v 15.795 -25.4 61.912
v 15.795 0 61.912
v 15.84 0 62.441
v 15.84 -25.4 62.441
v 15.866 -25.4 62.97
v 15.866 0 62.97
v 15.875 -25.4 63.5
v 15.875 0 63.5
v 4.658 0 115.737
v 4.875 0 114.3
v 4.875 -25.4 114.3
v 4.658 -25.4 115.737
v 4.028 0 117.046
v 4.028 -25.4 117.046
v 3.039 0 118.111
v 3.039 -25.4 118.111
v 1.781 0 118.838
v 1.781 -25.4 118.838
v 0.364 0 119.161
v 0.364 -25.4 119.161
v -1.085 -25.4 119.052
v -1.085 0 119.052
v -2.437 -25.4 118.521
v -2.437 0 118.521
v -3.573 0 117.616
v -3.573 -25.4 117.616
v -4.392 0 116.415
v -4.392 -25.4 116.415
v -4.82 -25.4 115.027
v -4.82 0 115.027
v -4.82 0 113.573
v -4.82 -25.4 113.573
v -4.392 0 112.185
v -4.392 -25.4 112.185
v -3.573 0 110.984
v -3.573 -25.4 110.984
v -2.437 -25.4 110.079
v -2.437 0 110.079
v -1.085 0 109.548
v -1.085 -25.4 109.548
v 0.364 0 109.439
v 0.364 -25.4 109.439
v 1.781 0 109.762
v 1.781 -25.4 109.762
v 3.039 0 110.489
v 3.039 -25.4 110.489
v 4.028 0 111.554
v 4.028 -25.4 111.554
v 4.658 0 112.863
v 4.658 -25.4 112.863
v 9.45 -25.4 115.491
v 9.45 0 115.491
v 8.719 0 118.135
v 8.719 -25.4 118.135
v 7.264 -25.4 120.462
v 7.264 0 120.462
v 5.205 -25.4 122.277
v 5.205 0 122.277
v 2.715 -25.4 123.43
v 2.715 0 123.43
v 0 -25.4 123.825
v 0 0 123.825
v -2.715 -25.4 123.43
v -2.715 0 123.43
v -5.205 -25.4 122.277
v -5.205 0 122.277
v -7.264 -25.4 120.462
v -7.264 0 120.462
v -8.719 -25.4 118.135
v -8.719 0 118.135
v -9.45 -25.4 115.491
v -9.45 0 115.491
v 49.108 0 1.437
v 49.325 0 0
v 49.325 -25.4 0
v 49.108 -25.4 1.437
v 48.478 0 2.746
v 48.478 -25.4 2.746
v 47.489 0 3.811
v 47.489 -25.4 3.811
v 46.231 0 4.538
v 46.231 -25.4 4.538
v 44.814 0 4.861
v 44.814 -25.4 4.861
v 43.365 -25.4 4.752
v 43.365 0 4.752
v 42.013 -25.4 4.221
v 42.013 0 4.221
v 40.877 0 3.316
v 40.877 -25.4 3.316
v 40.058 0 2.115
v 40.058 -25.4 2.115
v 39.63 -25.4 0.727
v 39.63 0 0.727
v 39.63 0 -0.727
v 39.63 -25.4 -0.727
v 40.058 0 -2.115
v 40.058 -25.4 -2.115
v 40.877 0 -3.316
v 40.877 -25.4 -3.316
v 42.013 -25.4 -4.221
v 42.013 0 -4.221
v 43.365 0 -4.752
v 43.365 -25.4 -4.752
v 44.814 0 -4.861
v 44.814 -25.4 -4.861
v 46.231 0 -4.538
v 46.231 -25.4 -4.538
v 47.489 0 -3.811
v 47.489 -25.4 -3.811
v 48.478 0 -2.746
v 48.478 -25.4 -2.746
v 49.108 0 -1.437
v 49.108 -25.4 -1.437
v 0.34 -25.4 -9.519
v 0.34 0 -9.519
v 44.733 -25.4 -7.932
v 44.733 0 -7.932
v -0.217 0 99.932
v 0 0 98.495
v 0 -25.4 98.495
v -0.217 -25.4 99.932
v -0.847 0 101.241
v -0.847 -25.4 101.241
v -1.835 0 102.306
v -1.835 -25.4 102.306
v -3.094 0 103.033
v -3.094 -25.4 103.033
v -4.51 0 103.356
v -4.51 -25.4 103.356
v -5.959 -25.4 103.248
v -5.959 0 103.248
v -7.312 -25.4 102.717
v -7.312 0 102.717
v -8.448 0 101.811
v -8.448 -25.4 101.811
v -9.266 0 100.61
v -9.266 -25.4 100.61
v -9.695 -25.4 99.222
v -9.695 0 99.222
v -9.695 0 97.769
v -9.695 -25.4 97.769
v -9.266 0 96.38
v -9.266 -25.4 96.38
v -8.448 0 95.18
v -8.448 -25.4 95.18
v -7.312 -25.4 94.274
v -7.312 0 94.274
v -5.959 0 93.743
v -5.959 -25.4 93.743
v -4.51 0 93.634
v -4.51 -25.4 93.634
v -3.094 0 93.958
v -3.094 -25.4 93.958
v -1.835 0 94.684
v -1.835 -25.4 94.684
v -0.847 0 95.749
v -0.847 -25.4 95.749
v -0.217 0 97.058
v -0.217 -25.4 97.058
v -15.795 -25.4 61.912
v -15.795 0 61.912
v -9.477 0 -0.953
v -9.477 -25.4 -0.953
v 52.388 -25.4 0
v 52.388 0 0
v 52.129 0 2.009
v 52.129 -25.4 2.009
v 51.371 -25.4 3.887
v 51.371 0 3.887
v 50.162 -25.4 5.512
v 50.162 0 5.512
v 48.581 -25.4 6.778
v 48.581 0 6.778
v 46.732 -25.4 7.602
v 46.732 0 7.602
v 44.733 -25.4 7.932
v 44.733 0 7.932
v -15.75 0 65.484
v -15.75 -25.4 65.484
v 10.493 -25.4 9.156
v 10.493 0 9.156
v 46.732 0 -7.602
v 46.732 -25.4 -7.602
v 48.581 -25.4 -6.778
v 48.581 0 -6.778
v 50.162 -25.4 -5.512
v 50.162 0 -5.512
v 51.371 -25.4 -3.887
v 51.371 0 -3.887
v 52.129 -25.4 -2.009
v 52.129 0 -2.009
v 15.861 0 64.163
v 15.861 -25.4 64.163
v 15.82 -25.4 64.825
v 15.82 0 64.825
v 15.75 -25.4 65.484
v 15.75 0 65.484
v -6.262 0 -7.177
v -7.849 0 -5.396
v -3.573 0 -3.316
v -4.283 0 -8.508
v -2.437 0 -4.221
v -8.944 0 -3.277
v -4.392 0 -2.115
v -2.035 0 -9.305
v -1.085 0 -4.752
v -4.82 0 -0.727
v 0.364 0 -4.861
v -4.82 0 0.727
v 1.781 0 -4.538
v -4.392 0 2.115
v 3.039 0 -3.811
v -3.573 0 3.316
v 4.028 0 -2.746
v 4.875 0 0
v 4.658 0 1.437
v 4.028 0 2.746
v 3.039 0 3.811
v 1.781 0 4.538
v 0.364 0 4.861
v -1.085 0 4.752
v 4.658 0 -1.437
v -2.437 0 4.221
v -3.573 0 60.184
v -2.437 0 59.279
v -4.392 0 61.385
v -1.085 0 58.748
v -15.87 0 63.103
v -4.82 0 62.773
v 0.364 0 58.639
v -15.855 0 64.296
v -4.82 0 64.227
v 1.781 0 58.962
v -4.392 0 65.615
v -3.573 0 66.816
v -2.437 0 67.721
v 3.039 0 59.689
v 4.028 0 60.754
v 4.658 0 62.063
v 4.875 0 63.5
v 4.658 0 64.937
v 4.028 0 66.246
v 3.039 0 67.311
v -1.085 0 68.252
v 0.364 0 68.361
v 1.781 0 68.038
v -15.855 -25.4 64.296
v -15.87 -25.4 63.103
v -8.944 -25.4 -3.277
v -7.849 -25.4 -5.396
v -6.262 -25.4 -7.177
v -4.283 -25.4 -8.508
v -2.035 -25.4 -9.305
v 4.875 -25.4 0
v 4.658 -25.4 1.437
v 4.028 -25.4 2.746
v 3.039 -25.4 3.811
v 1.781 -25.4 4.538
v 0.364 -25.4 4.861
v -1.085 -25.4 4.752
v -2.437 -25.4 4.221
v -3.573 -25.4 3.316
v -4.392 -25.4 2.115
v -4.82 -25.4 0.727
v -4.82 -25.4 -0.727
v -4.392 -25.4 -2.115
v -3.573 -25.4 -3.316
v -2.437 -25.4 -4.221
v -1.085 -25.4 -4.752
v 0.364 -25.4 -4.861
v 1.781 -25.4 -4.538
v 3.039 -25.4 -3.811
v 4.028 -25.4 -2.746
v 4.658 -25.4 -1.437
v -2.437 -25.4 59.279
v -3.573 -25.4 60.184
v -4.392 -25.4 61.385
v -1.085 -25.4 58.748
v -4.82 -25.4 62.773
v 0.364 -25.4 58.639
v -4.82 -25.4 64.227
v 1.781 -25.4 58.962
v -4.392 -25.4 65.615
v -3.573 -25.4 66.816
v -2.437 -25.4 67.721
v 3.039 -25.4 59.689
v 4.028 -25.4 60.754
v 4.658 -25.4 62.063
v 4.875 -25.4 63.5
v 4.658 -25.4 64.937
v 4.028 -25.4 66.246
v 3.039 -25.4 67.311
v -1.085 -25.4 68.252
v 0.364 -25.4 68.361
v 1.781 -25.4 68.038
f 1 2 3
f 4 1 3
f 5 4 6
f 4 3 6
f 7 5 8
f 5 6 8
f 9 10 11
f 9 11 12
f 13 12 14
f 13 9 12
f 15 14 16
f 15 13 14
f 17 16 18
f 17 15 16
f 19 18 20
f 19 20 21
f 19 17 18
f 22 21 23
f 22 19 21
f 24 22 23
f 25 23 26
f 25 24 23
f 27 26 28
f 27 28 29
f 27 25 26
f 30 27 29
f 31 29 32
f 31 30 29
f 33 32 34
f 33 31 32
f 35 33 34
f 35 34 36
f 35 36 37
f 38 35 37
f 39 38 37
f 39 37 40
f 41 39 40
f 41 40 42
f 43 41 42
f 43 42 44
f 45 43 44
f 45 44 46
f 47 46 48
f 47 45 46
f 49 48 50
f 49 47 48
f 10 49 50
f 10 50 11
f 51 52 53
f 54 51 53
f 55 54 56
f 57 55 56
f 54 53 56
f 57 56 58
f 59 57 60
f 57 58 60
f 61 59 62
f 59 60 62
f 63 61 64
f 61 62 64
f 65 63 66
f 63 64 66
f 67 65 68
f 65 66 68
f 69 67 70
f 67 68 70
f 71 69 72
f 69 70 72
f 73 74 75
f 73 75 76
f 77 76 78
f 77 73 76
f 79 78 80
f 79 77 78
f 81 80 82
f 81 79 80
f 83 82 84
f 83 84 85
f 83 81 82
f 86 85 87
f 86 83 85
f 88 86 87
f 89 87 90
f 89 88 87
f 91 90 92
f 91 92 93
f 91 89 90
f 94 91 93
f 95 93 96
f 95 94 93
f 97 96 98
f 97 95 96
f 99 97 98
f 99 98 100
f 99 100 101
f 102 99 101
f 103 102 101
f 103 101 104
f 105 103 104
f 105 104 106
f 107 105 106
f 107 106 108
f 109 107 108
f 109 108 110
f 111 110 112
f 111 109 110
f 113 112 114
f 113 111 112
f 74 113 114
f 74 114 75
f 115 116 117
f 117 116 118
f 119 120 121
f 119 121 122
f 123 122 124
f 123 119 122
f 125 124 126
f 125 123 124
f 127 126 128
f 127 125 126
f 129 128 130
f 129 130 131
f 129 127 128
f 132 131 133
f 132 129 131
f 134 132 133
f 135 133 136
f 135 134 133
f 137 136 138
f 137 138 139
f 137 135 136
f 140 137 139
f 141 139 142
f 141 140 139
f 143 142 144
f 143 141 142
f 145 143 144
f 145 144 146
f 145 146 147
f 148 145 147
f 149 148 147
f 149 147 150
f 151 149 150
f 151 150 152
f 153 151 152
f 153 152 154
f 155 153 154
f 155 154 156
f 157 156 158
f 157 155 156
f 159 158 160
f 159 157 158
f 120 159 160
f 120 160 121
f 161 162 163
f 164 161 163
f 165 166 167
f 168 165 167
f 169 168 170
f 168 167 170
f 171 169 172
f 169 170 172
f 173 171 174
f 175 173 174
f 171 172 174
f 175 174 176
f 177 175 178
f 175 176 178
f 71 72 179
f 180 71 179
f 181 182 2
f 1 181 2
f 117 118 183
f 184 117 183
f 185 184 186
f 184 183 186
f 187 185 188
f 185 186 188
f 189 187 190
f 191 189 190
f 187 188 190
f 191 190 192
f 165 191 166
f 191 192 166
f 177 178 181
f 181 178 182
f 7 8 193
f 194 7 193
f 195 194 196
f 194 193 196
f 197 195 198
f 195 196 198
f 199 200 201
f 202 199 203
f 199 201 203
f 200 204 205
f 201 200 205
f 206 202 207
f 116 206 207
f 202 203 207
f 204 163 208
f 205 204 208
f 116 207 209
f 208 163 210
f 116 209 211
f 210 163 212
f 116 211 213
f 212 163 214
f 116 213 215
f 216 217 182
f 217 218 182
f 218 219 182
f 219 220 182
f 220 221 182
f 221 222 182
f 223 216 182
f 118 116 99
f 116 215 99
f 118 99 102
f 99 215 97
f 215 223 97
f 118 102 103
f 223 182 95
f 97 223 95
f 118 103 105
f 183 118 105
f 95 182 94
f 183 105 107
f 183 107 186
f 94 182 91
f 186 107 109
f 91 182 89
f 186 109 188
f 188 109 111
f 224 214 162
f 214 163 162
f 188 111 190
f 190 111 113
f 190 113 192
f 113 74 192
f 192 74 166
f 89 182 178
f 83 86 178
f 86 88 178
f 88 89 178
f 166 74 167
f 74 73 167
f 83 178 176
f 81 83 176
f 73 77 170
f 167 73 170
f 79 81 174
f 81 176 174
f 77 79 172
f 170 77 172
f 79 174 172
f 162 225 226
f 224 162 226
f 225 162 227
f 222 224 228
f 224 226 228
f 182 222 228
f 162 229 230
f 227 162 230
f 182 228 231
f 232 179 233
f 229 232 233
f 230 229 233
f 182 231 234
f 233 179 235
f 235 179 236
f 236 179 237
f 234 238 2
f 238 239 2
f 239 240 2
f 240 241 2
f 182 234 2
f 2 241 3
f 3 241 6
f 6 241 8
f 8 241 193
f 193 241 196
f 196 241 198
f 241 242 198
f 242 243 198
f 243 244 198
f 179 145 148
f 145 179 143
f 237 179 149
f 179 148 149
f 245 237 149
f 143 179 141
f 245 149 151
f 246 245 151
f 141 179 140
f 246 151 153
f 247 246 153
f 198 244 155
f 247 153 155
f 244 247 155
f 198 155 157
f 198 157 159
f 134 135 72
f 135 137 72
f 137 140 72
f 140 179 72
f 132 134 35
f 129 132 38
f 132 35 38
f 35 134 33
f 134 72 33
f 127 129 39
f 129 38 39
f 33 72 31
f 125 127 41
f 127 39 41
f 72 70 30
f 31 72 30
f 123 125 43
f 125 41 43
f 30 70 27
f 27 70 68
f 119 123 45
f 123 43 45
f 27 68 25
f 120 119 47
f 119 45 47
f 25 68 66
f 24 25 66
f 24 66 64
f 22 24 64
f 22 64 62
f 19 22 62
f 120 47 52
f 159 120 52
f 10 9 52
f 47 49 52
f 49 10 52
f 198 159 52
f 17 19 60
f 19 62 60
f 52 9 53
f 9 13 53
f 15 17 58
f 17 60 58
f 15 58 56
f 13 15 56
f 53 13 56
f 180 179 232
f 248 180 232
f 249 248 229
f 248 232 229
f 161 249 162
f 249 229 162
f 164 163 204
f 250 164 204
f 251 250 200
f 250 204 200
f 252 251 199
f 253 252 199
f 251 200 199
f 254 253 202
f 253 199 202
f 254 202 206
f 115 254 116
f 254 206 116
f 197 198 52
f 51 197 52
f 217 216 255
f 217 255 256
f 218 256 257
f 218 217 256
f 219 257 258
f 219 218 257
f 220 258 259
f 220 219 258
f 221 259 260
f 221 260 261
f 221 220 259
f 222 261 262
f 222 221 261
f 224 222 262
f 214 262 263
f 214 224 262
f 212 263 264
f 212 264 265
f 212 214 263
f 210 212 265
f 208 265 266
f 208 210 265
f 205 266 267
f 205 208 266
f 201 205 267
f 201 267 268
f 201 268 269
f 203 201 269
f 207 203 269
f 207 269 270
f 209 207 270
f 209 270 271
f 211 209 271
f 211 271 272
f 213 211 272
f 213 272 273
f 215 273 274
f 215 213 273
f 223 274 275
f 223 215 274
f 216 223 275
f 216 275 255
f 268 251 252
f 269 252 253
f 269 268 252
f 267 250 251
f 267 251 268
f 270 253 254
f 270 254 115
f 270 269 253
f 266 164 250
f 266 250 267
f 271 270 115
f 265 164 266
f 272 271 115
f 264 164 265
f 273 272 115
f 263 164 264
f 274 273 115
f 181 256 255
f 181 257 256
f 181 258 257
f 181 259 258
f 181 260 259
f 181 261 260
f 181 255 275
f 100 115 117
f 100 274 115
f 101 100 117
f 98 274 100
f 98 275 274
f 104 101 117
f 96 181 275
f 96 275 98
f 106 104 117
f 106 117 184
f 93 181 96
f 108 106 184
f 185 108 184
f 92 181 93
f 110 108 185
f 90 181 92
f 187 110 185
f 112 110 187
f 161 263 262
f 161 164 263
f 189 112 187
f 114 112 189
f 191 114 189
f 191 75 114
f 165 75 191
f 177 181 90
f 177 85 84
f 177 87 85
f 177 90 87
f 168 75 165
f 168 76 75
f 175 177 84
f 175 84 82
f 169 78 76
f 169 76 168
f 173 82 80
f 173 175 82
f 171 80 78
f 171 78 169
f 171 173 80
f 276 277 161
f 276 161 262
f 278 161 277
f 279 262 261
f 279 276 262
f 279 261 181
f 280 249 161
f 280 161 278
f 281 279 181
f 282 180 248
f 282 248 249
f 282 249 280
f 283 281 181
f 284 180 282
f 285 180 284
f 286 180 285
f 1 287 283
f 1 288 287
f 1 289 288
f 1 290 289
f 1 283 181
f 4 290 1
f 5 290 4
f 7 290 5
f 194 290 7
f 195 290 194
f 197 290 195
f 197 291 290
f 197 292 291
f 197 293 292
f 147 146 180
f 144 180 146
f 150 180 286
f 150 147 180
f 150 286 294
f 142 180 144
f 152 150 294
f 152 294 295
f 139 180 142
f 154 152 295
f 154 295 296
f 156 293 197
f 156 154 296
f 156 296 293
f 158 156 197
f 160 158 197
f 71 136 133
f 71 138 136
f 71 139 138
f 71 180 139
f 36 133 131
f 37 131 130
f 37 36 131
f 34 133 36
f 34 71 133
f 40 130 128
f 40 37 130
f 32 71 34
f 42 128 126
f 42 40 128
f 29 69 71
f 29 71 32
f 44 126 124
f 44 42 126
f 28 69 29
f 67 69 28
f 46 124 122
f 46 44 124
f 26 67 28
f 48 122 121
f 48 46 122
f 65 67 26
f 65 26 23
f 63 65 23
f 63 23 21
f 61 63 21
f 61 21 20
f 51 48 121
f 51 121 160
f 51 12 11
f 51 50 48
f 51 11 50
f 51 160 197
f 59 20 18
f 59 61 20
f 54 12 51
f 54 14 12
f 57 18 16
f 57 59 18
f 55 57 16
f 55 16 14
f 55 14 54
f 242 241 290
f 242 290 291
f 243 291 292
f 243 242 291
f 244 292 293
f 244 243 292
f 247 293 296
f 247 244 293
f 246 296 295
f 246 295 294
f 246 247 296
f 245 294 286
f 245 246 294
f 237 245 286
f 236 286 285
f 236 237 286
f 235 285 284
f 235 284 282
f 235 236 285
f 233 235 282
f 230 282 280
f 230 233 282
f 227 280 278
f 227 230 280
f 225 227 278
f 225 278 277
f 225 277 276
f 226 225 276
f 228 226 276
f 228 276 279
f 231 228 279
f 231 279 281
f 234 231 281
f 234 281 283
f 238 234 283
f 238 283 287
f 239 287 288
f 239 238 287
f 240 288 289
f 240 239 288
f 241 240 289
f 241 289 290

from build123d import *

# Parameters (mm, degrees)
F0_R     = 4.8745106906
F1_DEPTH = 25.4


with BuildPart() as f1:
    # F0 (on Front) → F1 (new body)
    with BuildSketch(Plane.XZ):
        with BuildLine():
            ThreePointArc((-9.4502929642, 115.490625), (-0.596483242, 104.7936951058), (9.525, 114.3))
            ThreePointArc((9.525, 114.3), (9.5063048942, 114.896483242), (9.4502929642, 115.490625))
            ThreePointArc((9.4502929642, 115.490625), (0, 123.825), (-9.4502929642, 115.490625))
        make_face()
        with Locations((0, 114.3)):
            Circle(F0_R, mode=Mode.SUBTRACT)
        with BuildLine():
            ThreePointArc((9.4502929642, 115.490625), (9.5063048942, 114.896483242), (9.525, 114.3))
            ThreePointArc((9.525, 114.3), (-0.596483242, 104.7936951058), (-9.4502929642, 115.490625))
            Line((-9.4502929642, 115.490625), (-15.7504882737, 65.484375))
            ThreePointArc((-15.7504882737, 65.484375), (0, 79.375), (15.7504882737, 65.484375))
            Line((15.7504882737, 65.484375), (9.4502929642, 115.490625))
        make_face()
        with Locations((-4.8745106906, 98.495259881)):
            Circle(F0_R, mode=Mode.SUBTRACT)
        with BuildLine():
            ThreePointArc((15.875, 63.5), (15.8438414904, 64.4941387366), (15.7504882737, 65.484375))
            ThreePointArc((15.7504882737, 65.484375), (0, 79.375), (-15.7504882737, 65.484375))
            ThreePointArc((-15.7504882737, 65.484375), (-15.8737438155, 63.6997054867), (-15.7954255641, 61.9125))
            ThreePointArc((-15.7954255641, 61.9125), (0, 47.625), (15.7954255641, 61.9125))
            ThreePointArc((15.7954255641, 61.9125), (15.8550939106, 62.7052534459), (15.875, 63.5))
        make_face()
        with Locations((0, 63.5)):
            Circle(F0_R, mode=Mode.SUBTRACT)
        with BuildLine():
            ThreePointArc((15.7954255641, 61.9125), (0, 47.625), (-15.7954255641, 61.9125))
            Line((-15.7954255641, 61.9125), (-9.4772553384, -0.9525))
            ThreePointArc((-9.4772553384, -0.9525), (-6.948684782, 6.5147068085), (0.3401785714, 9.5189234444))
            Line((0.3401785714, 9.5189234444), (10.4932062399, 9.1560838367))
            Line((10.4932062399, 9.1560838367), (15.7954255641, 61.9125))
        make_face()
        with BuildLine():
            ThreePointArc((0.3401785714, 9.5189234444), (-6.948684782, 6.5147068085), (-9.4772553384, -0.9525))
            ThreePointArc((-9.4772553384, -0.9525), (-6.2623833816, -7.1769199091), (0.3401785714, -9.5189234444))
            ThreePointArc((0.3401785714, -9.5189234444), (6.5147068085, -6.948684782), (9.4772553384, -0.9525))
            ThreePointArc((9.4772553384, -0.9525), (9.5130563464, -0.4768479324), (9.525, 0))
            ThreePointArc((9.525, 0), (6.8544082857, 6.6138273378), (0.3401785714, 9.5189234444))
        make_face()
        Circle(F0_R, mode=Mode.SUBTRACT)
        with BuildLine():
            Line((44.7334821429, 7.9324362036), (10.4932062399, 9.1560838367))
            Line((10.4932062399, 9.1560838367), (9.4772553384, -0.9525))
            ThreePointArc((9.4772553384, -0.9525), (6.5147068085, -6.948684782), (0.3401785714, -9.5189234444))
            Line((0.3401785714, -9.5189234444), (44.7334821429, -7.9324362036))
            ThreePointArc((44.7334821429, -7.9324362036), (36.5125, 0), (44.7334821429, 7.9324362036))
        make_face()
        with BuildLine():
            Line((9.4772553384, -0.9525), (10.4932062399, 9.1560838367))
            Line((10.4932062399, 9.1560838367), (0.3401785714, 9.5189234444))
            ThreePointArc((0.3401785714, 9.5189234444), (6.8544082857, 6.6138273378), (9.525, 0))
            ThreePointArc((9.525, 0), (9.5130563464, -0.4768479324), (9.4772553384, -0.9525))
        make_face()
        with BuildLine():
            ThreePointArc((52.3875, 0), (50.1620069047, 5.5115227815), (44.7334821429, 7.9324362036))
            ThreePointArc((44.7334821429, 7.9324362036), (36.5125, 0), (44.7334821429, -7.9324362036))
            ThreePointArc((44.7334821429, -7.9324362036), (50.1620069047, -5.5115227815), (52.3875, 0))
        make_face()
        with Locations((44.45, 0)):
            Circle(F0_R, mode=Mode.SUBTRACT)
    extrude(amount=F1_DEPTH)


solid = f1.part
